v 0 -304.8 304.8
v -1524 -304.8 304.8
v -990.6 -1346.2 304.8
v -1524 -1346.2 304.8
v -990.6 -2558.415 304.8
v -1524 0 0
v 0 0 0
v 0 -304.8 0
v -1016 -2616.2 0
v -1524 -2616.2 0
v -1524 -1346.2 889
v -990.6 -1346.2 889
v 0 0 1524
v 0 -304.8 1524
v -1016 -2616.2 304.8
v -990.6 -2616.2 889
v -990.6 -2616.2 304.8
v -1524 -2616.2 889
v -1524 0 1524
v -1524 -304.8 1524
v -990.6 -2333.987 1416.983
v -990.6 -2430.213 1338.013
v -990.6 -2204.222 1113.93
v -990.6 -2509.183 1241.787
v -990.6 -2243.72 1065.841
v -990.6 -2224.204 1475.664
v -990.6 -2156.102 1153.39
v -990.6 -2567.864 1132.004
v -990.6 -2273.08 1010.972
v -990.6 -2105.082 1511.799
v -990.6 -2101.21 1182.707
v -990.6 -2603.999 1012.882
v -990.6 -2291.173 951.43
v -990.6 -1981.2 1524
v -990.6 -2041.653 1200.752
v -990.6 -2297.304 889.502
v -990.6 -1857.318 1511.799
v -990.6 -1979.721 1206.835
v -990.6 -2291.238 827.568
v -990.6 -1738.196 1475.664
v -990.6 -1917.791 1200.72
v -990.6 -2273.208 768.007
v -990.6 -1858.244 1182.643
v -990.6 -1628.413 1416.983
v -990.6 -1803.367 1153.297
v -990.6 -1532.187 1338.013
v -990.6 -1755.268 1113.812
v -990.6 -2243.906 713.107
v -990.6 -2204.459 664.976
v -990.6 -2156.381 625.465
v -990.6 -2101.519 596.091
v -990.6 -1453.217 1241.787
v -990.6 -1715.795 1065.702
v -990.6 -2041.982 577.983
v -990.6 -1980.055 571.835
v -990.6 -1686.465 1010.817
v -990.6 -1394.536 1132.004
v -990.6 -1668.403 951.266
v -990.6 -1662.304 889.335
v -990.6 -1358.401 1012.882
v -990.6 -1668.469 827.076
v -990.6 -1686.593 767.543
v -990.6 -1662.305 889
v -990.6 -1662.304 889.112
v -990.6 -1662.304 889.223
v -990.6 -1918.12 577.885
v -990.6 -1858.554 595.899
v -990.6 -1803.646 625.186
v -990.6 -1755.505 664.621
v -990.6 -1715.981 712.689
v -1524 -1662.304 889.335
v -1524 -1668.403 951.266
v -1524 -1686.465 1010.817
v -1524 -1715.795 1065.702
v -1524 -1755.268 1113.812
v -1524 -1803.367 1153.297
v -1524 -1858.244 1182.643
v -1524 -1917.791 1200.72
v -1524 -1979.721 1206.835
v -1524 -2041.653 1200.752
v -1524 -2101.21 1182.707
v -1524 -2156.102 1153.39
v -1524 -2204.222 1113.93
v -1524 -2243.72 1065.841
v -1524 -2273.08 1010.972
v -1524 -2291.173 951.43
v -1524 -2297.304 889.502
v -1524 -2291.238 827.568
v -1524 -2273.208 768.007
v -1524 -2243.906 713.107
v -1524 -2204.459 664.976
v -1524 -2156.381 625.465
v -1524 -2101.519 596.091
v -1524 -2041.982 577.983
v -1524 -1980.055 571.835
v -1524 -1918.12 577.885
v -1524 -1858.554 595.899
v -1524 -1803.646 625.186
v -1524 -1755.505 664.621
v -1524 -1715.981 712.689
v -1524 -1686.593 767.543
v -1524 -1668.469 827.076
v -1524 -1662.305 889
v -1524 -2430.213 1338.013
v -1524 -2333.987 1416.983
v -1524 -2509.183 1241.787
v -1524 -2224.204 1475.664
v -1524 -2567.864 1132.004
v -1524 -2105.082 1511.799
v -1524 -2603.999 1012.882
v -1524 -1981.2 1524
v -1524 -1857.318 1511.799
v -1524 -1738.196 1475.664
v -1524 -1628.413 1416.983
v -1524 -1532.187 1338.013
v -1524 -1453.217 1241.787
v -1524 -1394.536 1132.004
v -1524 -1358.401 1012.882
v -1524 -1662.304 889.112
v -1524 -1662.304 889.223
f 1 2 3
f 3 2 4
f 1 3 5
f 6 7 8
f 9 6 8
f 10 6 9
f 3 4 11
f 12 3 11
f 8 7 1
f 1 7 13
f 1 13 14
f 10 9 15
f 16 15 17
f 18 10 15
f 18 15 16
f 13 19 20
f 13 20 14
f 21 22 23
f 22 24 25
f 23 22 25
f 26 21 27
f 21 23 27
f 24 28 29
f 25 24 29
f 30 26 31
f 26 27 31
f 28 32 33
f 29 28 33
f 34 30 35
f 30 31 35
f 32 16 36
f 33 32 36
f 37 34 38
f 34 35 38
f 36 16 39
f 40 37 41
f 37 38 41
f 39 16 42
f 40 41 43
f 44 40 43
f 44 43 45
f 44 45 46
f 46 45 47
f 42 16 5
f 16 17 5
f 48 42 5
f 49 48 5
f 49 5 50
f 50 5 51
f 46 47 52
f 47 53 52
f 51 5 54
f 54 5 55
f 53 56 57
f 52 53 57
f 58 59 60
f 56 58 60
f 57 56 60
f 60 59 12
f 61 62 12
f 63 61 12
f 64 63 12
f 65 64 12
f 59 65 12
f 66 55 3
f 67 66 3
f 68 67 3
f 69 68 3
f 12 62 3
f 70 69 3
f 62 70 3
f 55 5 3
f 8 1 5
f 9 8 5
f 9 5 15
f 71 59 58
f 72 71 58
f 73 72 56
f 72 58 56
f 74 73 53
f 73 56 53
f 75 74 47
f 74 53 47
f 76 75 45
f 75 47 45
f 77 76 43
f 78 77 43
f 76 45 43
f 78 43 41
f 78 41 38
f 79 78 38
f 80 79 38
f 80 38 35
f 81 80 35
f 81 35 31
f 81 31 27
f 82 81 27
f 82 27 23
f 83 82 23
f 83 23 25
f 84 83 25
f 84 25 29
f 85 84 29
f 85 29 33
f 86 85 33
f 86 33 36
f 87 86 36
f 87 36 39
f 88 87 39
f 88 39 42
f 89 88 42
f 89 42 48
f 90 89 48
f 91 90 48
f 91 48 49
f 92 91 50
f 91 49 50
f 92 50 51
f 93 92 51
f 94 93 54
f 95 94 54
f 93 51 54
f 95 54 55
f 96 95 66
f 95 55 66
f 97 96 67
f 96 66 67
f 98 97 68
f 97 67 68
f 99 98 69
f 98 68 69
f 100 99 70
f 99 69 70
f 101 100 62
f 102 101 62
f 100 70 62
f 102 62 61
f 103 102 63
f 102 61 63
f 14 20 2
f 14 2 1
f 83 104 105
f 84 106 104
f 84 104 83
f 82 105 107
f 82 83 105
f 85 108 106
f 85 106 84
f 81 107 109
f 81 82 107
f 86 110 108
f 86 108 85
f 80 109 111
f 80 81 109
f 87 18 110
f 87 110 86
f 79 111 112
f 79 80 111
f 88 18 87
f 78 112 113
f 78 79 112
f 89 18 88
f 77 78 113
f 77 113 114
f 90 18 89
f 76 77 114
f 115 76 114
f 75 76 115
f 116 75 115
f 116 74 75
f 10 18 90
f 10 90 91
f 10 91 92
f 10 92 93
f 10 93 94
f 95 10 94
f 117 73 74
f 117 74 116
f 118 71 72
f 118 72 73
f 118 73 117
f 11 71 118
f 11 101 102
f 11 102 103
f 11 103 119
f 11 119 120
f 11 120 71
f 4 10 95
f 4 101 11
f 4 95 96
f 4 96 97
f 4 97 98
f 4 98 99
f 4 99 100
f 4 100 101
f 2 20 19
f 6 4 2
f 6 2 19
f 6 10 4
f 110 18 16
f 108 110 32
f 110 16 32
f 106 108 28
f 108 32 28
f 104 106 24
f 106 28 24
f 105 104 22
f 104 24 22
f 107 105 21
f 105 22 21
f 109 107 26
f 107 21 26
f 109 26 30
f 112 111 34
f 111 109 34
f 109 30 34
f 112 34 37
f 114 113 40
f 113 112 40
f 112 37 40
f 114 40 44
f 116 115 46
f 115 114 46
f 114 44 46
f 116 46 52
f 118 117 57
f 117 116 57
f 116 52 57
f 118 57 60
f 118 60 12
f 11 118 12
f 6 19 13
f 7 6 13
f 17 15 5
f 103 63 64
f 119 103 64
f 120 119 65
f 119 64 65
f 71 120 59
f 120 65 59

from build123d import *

# Parameters (mm, degrees)
F0_W      = 1524
F0_H      = 1524
F1_DEPTH  = 304.8
F2_W      = 2311.4
F2_H      = 304.8
F3_DEPTH  = 1524
F5_DEPTH  = 1008.38
F6_W      = 508
F6_H      = 1270
F7_DEPTH  = 1524
F8_DEPTH  = 25.4
F11_DEPTH = 1397
F12_DEPTH = 782.32


with BuildPart() as f1:
    # F0 (on Front) → F1 (new body)
    with BuildSketch(Plane.XZ):
        with Locations((-762, 762)):
            Rectangle(F0_W, F0_H)
    extrude(amount=F1_DEPTH)

    # F2 (on face) → F3 (join)
    with BuildSketch(Plane(origin=(-1524, 0, 0), x_dir=(0, -1, 0), z_dir=(-1, 0, 0))):
        with Locations((1460.5, 152.4)):
            Rectangle(F2_W, F2_H)
    extrude(amount=-F3_DEPTH)

    # F4 (on face) → F5 (cut)
    with BuildSketch(Plane.XY.offset(304.8)):
        Polygon((0, -304.8), (-1016, -2616.2), (0, -2616.2), align=None)
    extrude(amount=-F5_DEPTH, mode=Mode.SUBTRACT)

    # F6 (on face) → F7 (join)
    with BuildSketch(Plane.XY.offset(304.8)):
        with Locations((-1270, -1981.2)):
            Rectangle(F6_W, F6_H)
    extrude(amount=F7_DEPTH)

    # F8 (add): a face of the model
    f8_faces = [f1.faces().sort_by_distance(p)[0] for p in [
        (-1016, -1981.2, 1066.8),
    ]]
    extrude(f8_faces, amount=F8_DEPTH)

    # F10 (on face) → F11 (cut)
    with BuildSketch(Plane.YZ.offset(-990.6)):
        with BuildLine():
            Line((-1981.2, 889), (-1981.2, 1206.8317305865))
            ThreePointArc((-1981.2, 1206.8317305865), (-2203.9354336027, 664.45365533), (-1662.3045731484, 889))
            Line((-1662.3045731484, 889), (-1981.2, 889))
        make_face()
        with BuildLine():
            ThreePointArc((-1662.3045731484, 889), (-1662.3044407591, 889.1673989063), (-1662.3043966293, 889.3347978592))
            ThreePointArc((-1662.3043966293, 889.3347978592), (-1755.7919573209, 1114.3340801583), (-1981.2, 1206.8317305865))
            Line((-1981.2, 1206.8317305865), (-1981.2, 889))
            Line((-1981.2, 889), (-1662.3045731484, 889))
        make_face()
    extrude(amount=-F11_DEPTH, mode=Mode.SUBTRACT)

    # F9 (on face) → F12 (cut)
    with BuildSketch(Plane.YZ.offset(-990.6)):
        with BuildLine():
            ThreePointArc((-1981.2, 1524), (-1532.1871939465, 1338.0128060535), (-1346.2, 889))
            Line((-1346.2, 889), (-1346.2, 1828.8))
            Line((-1346.2, 1828.8), (-2616.2, 1828.8))
            Line((-2616.2, 1828.8), (-2616.2, 889))
            ThreePointArc((-2616.2, 889), (-2430.2128060535, 1338.0128060535), (-1981.2, 1524))
        make_face()
    extrude(amount=-F12_DEPTH, mode=Mode.SUBTRACT)


solid = f1.part
